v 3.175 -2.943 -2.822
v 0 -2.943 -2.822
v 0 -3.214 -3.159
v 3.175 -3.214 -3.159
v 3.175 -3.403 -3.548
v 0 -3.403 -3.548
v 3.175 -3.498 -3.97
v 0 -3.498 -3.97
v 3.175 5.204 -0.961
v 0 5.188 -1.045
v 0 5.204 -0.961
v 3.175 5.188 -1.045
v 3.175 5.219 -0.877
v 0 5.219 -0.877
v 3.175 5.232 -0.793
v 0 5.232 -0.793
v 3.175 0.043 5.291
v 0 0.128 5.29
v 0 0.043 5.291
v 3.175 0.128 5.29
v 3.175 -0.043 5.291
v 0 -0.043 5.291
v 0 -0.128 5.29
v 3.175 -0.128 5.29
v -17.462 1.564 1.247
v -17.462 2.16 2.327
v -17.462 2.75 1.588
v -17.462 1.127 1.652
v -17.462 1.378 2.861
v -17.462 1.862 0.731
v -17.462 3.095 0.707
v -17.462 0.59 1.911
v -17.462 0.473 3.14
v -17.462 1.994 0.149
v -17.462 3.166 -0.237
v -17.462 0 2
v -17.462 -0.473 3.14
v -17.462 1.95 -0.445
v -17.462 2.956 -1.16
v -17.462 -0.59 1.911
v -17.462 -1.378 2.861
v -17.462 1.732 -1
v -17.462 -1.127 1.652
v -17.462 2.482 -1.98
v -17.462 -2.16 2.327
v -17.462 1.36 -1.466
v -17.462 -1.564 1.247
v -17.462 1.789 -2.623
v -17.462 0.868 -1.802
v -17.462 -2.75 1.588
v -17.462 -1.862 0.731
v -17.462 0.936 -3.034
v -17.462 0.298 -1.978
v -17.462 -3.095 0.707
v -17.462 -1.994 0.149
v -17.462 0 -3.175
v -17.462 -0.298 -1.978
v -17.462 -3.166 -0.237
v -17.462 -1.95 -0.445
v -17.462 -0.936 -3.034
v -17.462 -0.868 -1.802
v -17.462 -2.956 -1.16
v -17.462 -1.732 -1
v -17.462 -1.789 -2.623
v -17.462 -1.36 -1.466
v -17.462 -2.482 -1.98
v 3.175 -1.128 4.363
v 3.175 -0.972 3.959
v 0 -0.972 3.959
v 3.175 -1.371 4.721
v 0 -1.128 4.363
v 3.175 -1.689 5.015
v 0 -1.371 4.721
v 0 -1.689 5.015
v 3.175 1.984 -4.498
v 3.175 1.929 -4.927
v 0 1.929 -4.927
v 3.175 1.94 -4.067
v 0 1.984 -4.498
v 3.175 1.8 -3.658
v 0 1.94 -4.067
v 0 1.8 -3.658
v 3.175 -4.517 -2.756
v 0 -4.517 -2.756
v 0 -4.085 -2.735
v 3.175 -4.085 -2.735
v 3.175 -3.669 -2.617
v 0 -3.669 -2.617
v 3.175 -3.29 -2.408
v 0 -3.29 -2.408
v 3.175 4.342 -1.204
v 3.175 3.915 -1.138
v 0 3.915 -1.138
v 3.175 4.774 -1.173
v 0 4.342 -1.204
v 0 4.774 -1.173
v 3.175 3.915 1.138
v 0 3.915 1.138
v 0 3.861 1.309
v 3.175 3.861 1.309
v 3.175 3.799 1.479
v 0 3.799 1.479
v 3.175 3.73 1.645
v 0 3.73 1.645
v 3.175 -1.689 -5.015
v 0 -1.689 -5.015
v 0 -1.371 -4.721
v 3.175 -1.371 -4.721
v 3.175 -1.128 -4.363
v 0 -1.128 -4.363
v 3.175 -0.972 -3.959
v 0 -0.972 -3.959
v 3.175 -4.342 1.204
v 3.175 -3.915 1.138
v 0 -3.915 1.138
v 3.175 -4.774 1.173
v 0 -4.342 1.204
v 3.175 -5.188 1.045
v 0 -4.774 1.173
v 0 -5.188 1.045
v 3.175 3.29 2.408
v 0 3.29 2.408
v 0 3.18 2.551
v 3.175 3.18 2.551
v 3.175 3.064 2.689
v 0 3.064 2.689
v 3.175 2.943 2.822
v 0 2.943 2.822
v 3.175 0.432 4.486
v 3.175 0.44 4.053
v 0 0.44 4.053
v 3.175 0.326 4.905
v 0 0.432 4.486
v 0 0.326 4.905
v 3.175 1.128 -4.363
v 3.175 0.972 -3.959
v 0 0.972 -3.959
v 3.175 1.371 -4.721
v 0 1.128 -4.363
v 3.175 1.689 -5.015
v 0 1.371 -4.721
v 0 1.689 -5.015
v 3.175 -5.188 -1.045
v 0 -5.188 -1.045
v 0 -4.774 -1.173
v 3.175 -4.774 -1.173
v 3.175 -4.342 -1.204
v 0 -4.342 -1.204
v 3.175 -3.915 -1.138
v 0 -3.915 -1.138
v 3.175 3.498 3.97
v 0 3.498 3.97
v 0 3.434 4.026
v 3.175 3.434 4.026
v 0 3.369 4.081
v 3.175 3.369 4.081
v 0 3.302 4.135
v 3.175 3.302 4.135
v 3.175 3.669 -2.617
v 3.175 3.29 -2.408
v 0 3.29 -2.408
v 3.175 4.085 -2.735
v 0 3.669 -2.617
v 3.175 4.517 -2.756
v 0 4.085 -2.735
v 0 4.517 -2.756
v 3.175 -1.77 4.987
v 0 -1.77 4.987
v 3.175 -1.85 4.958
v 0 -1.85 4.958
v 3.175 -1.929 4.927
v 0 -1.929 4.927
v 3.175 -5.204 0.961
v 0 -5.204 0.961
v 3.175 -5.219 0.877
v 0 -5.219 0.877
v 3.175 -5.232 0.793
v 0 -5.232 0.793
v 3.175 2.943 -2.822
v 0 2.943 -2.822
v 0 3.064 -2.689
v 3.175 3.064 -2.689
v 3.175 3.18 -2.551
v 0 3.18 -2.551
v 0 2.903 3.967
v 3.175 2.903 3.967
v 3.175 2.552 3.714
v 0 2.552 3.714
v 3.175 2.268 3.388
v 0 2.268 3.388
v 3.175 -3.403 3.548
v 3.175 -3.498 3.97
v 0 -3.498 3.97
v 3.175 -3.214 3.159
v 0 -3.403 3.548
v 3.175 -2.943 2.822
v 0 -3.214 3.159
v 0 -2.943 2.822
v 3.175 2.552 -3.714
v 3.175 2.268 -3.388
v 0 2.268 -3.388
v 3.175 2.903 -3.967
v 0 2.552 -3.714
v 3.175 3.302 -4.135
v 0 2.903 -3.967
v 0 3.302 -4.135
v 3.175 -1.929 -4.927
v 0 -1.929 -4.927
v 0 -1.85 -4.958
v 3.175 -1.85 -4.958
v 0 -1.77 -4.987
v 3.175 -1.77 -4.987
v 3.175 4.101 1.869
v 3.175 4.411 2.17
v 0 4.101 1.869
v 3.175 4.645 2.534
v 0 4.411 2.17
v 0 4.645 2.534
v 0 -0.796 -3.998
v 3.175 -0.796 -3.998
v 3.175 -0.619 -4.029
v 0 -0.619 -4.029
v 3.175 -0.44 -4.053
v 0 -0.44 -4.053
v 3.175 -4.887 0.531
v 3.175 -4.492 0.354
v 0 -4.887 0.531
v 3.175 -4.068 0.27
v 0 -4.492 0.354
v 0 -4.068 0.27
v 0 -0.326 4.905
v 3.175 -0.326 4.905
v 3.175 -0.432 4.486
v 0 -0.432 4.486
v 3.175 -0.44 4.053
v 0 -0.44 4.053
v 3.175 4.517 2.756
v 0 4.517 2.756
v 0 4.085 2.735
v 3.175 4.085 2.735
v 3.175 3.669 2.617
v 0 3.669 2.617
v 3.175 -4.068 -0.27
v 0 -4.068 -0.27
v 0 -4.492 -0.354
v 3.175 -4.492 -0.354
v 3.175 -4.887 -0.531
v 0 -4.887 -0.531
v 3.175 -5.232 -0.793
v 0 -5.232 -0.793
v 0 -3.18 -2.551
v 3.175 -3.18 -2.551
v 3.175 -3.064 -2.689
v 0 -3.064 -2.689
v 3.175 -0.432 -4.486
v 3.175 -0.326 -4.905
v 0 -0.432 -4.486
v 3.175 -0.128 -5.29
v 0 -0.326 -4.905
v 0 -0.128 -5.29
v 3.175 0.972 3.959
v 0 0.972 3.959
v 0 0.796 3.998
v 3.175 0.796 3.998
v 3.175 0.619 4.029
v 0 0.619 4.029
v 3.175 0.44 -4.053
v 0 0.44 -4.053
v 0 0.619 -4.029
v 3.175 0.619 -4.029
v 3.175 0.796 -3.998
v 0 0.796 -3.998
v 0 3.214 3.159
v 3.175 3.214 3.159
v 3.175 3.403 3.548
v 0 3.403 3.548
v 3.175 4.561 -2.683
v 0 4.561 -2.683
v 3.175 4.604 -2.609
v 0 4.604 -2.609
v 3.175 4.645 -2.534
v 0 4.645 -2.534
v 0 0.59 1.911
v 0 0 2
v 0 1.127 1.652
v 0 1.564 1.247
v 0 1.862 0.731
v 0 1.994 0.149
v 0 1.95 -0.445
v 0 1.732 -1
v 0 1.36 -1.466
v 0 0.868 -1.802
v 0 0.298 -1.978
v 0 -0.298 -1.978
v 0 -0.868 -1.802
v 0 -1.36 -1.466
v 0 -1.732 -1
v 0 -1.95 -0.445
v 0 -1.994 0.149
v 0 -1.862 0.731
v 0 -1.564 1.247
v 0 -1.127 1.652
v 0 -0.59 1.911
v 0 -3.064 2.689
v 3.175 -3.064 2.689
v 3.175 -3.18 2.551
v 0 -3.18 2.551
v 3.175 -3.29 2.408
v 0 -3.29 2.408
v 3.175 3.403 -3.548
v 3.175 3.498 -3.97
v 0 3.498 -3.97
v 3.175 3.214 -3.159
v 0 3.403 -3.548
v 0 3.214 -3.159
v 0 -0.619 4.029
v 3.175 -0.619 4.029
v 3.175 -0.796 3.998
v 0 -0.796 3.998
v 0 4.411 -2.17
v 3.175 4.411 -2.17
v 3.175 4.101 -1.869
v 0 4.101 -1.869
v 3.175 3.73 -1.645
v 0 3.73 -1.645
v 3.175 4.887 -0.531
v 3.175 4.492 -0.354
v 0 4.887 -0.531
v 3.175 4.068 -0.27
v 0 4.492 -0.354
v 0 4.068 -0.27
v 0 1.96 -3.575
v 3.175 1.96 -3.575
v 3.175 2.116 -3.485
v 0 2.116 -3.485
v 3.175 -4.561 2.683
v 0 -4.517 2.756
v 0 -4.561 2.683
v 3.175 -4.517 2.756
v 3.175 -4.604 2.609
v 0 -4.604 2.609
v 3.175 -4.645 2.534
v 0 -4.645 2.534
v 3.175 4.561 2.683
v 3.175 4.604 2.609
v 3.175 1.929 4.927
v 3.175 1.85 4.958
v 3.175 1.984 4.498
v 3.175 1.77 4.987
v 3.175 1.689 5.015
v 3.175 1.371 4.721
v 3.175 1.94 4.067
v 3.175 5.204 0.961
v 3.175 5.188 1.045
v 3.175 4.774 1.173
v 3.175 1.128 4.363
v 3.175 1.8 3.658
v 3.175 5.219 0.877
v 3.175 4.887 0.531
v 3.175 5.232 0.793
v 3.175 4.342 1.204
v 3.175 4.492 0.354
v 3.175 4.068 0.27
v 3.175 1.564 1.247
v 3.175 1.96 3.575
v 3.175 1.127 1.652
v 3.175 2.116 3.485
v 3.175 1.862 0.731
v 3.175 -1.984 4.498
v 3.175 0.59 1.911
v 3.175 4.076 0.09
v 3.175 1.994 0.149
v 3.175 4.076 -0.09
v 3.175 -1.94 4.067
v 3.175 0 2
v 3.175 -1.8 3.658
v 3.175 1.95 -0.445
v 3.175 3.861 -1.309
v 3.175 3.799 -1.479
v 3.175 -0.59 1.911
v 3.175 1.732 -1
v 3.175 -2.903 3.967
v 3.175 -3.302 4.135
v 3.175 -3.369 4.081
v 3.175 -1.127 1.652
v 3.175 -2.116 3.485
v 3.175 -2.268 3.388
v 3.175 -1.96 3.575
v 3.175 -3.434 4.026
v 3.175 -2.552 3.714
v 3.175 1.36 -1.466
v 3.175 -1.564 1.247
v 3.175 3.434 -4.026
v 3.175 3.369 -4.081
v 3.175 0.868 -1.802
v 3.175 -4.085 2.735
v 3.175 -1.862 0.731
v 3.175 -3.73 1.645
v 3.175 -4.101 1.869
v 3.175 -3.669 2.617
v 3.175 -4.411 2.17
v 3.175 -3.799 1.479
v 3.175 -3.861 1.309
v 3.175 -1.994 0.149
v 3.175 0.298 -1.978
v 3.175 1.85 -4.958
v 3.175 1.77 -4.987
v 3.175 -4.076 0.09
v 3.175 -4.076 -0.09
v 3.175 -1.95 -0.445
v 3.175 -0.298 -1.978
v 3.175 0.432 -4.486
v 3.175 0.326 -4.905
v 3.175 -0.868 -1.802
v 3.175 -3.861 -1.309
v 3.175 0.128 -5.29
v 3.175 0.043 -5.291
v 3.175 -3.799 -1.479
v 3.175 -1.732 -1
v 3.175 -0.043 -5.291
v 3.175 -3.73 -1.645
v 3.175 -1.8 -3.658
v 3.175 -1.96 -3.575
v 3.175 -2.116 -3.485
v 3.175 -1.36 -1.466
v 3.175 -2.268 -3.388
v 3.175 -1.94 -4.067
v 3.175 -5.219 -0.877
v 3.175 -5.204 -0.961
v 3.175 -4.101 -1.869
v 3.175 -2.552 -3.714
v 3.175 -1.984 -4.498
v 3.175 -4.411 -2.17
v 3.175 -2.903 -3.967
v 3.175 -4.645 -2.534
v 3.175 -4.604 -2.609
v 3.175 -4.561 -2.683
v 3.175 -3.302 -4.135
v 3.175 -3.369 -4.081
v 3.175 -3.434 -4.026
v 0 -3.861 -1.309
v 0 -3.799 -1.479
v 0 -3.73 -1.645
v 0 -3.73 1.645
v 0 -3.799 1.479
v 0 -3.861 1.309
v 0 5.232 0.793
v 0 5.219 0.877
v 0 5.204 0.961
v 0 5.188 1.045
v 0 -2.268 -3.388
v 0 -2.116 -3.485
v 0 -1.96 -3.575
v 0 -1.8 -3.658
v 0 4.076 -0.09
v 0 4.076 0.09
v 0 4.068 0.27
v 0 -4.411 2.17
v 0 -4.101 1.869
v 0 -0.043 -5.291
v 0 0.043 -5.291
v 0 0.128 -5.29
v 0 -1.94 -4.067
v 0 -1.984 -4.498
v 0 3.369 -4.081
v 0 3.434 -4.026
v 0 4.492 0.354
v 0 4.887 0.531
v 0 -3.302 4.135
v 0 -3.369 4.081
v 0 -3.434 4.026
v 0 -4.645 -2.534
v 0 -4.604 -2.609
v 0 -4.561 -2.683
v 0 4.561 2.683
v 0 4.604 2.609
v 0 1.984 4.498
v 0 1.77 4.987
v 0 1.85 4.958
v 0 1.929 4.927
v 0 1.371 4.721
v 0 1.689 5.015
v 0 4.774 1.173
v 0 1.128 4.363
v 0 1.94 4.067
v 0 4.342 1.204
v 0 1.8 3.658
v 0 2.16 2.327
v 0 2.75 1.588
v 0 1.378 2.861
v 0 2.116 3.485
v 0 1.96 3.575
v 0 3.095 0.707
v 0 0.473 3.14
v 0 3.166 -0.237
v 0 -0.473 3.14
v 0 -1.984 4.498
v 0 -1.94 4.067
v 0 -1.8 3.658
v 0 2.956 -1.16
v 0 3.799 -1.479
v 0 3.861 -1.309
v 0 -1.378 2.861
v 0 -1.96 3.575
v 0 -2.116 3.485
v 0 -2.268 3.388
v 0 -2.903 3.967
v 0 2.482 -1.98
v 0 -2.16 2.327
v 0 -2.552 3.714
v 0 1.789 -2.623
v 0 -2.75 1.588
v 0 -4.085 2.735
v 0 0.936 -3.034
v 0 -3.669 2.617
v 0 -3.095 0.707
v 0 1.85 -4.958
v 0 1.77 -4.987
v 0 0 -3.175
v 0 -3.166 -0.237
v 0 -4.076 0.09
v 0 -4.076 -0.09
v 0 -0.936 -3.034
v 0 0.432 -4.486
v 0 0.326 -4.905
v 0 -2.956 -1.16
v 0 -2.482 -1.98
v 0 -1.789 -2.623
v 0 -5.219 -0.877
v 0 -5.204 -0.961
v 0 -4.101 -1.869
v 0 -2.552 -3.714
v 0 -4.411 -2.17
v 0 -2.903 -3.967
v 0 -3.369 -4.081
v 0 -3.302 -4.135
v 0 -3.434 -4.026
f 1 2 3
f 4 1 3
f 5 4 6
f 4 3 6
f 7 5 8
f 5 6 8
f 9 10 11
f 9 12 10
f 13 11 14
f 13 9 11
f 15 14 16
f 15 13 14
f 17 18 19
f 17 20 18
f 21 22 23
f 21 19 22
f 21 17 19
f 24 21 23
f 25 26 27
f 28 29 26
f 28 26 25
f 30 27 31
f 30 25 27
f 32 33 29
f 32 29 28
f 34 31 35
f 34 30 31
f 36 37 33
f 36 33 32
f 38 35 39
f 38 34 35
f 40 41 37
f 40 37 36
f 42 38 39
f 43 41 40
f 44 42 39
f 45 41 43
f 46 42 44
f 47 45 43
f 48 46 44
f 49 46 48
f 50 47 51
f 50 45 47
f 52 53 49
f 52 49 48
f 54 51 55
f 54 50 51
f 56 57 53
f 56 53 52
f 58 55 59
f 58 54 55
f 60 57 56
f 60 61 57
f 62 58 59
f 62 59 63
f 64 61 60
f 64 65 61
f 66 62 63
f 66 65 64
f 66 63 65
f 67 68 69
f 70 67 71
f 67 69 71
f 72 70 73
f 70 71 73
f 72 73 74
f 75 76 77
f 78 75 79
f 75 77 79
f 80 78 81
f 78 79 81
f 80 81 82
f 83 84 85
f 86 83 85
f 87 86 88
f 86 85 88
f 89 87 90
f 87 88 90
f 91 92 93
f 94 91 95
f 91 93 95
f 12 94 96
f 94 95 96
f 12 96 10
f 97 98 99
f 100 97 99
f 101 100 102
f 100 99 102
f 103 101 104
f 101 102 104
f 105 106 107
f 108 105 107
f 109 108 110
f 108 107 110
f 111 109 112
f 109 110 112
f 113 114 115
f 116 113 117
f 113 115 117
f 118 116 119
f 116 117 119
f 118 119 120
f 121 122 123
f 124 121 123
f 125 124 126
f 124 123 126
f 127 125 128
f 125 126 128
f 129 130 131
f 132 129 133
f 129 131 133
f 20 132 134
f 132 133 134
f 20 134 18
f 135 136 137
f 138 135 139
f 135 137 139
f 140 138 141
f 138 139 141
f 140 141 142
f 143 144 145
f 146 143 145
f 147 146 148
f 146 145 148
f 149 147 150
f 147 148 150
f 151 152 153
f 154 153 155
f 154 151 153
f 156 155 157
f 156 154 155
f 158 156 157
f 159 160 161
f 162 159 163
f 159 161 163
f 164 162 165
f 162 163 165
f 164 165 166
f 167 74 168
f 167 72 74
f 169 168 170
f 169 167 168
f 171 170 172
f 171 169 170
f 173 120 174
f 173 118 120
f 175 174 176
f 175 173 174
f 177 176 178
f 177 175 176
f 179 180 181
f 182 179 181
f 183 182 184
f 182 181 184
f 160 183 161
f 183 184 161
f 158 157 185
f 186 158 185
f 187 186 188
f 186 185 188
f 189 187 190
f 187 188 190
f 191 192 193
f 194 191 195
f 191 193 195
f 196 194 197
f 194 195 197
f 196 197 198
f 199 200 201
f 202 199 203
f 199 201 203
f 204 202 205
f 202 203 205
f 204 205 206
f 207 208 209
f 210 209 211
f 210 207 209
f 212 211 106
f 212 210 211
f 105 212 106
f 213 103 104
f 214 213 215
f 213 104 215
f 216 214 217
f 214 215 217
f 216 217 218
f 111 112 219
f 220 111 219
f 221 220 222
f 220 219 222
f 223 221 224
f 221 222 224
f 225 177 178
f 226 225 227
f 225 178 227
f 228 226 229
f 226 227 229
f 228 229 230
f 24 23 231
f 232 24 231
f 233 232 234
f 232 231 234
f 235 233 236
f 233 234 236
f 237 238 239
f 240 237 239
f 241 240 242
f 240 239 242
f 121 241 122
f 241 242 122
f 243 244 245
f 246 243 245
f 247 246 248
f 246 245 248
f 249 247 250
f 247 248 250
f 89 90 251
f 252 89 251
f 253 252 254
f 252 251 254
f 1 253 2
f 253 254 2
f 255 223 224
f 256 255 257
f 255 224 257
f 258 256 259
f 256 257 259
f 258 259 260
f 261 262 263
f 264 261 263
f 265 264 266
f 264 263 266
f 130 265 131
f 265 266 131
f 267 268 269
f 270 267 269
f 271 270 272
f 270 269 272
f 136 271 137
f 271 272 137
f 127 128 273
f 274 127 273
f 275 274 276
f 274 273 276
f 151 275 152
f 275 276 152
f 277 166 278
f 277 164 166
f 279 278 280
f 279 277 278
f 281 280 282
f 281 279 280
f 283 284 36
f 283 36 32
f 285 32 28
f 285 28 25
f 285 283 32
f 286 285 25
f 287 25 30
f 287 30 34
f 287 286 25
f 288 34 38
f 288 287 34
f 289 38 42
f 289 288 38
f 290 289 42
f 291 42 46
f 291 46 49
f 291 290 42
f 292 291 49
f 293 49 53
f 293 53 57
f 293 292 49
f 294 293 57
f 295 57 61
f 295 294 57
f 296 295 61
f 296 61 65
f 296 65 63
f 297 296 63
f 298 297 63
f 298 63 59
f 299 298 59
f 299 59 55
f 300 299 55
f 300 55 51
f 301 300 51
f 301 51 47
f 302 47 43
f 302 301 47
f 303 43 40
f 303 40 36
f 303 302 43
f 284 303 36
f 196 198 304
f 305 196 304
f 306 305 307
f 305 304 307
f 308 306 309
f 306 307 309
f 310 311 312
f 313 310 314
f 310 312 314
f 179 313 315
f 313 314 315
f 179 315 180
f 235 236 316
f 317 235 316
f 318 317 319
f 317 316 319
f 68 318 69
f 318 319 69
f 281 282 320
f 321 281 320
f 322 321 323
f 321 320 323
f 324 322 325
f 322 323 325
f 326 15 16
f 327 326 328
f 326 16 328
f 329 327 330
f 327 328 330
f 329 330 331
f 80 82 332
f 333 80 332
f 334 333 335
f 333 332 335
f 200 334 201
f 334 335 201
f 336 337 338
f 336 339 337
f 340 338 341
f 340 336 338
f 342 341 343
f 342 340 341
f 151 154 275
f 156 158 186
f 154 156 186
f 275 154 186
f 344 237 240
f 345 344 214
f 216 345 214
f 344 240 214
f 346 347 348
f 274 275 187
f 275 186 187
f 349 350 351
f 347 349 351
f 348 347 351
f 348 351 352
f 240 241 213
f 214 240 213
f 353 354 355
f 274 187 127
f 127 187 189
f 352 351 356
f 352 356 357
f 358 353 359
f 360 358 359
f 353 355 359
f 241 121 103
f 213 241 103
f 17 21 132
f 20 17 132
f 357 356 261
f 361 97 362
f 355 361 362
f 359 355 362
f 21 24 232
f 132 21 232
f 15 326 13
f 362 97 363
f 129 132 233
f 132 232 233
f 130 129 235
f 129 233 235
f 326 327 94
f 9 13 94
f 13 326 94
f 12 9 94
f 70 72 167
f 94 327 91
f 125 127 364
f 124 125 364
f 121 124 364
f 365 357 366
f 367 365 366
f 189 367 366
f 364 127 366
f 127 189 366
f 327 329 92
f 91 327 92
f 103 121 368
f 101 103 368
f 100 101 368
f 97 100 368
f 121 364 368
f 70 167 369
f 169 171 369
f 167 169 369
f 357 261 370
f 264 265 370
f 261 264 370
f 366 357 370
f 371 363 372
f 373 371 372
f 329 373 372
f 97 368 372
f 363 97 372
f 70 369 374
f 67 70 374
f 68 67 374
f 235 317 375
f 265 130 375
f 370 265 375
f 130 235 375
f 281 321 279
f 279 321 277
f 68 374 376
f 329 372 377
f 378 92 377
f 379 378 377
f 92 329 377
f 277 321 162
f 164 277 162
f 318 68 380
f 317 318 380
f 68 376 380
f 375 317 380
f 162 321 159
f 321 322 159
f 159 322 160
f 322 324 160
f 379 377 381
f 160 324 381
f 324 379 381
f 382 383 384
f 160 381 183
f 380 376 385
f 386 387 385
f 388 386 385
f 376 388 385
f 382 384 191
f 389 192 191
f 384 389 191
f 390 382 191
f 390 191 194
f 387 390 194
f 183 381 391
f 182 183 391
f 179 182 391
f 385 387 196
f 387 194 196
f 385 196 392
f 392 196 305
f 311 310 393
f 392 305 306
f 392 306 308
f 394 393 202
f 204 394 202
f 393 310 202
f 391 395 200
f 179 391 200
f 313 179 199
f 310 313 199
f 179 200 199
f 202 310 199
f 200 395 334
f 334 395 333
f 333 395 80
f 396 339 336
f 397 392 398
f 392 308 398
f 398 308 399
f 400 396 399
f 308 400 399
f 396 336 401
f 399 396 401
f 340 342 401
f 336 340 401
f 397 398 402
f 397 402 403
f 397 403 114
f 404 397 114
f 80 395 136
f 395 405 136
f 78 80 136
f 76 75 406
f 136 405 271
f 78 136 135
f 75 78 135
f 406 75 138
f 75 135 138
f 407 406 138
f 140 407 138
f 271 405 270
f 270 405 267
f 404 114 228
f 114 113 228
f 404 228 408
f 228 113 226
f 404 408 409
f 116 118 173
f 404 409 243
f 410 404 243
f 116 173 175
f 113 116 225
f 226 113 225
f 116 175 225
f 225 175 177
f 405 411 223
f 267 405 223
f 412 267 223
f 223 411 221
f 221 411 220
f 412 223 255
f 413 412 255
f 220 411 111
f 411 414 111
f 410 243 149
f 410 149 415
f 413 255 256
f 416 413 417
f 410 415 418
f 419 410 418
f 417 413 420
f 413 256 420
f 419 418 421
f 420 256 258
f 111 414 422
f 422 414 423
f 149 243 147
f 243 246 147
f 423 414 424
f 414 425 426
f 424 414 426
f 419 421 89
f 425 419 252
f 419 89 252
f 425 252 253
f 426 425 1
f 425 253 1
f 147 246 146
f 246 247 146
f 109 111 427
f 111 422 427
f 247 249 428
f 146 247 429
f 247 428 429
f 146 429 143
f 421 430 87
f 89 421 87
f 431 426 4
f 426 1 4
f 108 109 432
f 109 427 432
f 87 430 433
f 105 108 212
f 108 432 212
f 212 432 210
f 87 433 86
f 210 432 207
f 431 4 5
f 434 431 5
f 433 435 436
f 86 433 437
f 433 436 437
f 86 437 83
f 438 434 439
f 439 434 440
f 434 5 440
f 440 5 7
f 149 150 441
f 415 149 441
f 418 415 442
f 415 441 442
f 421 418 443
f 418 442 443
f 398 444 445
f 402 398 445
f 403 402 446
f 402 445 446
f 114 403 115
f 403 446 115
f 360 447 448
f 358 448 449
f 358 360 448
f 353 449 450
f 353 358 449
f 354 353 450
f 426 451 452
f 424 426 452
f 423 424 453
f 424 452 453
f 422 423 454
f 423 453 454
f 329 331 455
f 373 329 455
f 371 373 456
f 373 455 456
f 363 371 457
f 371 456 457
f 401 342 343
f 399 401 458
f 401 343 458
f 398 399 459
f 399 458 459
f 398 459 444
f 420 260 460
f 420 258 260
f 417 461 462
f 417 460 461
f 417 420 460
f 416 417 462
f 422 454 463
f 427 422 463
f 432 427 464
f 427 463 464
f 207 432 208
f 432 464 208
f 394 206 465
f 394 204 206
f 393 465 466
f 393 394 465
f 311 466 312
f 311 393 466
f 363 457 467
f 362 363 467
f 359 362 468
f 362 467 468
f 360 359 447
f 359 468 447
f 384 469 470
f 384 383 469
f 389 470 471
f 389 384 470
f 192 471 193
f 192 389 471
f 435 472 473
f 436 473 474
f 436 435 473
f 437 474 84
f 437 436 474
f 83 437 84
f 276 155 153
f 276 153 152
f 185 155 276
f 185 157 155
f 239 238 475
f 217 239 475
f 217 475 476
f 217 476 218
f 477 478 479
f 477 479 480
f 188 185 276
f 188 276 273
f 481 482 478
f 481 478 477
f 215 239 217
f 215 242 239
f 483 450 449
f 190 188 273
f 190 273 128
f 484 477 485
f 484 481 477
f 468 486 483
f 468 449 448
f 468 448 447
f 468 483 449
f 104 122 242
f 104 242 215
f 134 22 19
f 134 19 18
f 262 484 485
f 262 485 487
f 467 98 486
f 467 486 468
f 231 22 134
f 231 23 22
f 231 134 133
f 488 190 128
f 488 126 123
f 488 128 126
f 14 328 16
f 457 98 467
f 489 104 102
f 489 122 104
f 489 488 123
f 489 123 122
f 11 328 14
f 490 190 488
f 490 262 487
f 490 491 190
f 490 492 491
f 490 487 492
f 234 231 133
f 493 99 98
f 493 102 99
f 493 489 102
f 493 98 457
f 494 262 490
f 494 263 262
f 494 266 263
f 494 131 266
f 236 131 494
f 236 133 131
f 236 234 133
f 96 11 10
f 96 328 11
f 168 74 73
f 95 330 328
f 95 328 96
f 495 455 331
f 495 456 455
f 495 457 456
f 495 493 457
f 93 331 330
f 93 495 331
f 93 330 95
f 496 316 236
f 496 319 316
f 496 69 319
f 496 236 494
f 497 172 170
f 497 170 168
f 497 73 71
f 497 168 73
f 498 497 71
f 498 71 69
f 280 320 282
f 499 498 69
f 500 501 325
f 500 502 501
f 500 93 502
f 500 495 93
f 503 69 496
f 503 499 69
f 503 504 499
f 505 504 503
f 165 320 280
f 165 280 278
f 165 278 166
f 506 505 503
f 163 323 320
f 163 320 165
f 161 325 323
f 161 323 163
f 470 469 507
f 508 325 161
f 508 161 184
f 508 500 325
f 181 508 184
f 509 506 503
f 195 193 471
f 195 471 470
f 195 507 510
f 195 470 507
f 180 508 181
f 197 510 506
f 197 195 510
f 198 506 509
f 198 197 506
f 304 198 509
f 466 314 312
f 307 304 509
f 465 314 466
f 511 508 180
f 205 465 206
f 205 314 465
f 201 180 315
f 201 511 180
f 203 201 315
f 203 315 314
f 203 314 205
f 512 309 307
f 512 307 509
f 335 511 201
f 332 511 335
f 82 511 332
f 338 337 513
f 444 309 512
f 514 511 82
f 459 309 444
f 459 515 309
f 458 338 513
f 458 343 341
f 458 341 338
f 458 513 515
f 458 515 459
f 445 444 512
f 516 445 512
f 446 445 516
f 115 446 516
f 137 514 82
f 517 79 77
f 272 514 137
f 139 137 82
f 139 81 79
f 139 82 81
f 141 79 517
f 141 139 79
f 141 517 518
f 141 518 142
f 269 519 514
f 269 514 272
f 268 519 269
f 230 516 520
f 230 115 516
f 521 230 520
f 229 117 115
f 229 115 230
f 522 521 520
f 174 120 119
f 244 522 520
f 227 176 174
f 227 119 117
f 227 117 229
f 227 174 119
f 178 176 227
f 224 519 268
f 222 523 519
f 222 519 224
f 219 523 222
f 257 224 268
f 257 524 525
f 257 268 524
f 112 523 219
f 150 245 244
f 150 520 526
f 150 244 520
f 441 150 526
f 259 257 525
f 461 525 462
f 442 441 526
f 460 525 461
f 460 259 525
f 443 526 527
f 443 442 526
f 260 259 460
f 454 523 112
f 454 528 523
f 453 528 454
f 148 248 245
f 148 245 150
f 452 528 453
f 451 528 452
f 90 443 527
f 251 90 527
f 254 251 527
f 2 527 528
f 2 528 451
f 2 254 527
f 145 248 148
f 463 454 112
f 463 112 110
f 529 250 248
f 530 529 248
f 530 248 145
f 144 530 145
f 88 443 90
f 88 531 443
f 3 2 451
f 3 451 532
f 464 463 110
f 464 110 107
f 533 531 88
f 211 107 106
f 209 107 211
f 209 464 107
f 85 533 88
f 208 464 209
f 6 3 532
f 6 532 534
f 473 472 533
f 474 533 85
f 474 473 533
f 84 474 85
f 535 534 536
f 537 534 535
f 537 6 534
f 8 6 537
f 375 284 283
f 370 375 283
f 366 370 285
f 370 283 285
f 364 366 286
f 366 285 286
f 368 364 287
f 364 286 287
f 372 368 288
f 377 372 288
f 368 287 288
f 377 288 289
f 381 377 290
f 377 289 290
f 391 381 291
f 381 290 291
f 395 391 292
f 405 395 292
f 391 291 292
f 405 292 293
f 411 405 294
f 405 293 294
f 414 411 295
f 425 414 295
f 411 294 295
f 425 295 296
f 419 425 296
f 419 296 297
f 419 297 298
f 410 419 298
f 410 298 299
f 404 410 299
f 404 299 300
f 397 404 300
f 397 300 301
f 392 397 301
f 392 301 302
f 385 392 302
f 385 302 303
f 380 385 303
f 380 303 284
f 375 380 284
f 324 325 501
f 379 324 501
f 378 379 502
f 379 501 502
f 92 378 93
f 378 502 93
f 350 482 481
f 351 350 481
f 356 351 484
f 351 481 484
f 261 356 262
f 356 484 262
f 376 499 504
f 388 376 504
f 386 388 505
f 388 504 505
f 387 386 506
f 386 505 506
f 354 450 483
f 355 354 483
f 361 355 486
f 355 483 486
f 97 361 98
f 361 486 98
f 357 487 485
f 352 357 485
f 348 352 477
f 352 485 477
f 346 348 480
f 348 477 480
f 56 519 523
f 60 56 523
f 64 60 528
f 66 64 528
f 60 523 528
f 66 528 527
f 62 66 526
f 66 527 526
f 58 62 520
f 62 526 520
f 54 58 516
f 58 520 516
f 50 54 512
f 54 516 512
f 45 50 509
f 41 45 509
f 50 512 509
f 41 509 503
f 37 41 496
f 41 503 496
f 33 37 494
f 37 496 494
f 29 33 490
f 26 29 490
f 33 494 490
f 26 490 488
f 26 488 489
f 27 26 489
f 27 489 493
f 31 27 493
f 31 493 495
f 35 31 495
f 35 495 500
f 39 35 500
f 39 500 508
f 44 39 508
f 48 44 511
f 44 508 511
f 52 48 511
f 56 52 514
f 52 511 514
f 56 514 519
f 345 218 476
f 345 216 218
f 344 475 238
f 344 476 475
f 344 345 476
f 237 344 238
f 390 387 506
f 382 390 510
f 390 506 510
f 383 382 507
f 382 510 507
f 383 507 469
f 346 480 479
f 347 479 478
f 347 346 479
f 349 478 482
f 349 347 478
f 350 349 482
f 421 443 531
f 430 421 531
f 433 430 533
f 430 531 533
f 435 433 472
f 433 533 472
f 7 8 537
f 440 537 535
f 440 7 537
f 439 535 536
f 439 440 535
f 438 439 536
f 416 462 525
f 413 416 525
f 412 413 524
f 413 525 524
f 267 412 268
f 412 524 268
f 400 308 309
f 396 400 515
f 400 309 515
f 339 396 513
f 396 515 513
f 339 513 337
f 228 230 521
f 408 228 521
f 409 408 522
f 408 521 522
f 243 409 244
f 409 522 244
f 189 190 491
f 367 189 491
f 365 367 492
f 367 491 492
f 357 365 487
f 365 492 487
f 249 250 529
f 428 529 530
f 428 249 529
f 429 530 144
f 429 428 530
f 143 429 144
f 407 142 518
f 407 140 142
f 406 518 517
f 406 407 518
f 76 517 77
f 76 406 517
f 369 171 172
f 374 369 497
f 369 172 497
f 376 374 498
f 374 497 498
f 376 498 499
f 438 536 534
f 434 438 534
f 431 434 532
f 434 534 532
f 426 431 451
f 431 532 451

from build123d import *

# Parameters (mm, degrees)
BASPROSKE_W         = 3.175
BASPROSKE_H         = 5.291666667
TOOTHCUT_DEPTH      = 9.129212583
TEETHCUTS_COUNT     = 18
TEETHCUTS_ANGLE     = 340
SKETCH2_R           = 2
CUT_EXTRUDE3_DEPTH  = 9.090468526
BOSS_EXTRUDE1_START = 17.4625
SKETCH2_3_R         = 3.175
SKETCH2_3_R_2       = 2
BOSS_EXTRUDE1_DEPTH = 17.4625


with BuildPart() as part:
    # BasProSke → Base-Revolve (revolve)
    with BuildSketch(Plane(origin=(0, 0, 0), x_dir=(1, 0, 0), z_dir=(0, 1, 0))):
        with Locations((1.5875, 2.645833334)):
            Rectangle(BASPROSKE_W, BASPROSKE_H)
    revolve(axis=Axis((-10, 0, 0), (1, 0, 0)))

    # TooCutSke → ToothCut (cut, through all)
    with BuildSketch(Plane(origin=(0, 0, 0), x_dir=(0, 0, -1), z_dir=(1, 0, 0))):
        with BuildLine():
            ThreePointArc((0.270003318, 4.067748898), (0, 4.0767), (-0.270003318, 4.067748898))
            ThreePointArc((-0.270003318, 4.067748898), (-0.437425956, 4.709129954), (-0.814487039, 5.254313352))
            ThreePointArc((-0.814487039, 5.254313352), (0, 5.317066667), (0.814487039, 5.254313352))
            ThreePointArc((0.814487039, 5.254313352), (0.437425956, 4.709129954), (0.270003318, 4.067748898))
        make_face()
    toothcut = extrude(amount=TOOTHCUT_DEPTH, mode=Mode.SUBTRACT)

    # TeethCuts: ToothCut ×18 about axis
    teethcuts_axis = Axis((-10, 0, 0), (1, 0, 0))
    for i in range(1, TEETHCUTS_COUNT):
        add(toothcut.rotate(teethcuts_axis, i * TEETHCUTS_ANGLE / (TEETHCUTS_COUNT - 1)), mode=Mode.SUBTRACT)

    # Sketch2 → Cut-Extrude3 (cut, through all)
    with BuildSketch(Plane.ZY):
        Circle(SKETCH2_R)
    extrude(amount=-CUT_EXTRUDE3_DEPTH, mode=Mode.SUBTRACT)

    # Sketch2<3> → Boss-Extrude1 (add)
    with BuildSketch(Plane.ZY.offset(BOSS_EXTRUDE1_START)):
        Circle(SKETCH2_3_R)
        Circle(SKETCH2_3_R_2, mode=Mode.SUBTRACT)
    extrude(amount=-BOSS_EXTRUDE1_DEPTH)


solid = part.part
